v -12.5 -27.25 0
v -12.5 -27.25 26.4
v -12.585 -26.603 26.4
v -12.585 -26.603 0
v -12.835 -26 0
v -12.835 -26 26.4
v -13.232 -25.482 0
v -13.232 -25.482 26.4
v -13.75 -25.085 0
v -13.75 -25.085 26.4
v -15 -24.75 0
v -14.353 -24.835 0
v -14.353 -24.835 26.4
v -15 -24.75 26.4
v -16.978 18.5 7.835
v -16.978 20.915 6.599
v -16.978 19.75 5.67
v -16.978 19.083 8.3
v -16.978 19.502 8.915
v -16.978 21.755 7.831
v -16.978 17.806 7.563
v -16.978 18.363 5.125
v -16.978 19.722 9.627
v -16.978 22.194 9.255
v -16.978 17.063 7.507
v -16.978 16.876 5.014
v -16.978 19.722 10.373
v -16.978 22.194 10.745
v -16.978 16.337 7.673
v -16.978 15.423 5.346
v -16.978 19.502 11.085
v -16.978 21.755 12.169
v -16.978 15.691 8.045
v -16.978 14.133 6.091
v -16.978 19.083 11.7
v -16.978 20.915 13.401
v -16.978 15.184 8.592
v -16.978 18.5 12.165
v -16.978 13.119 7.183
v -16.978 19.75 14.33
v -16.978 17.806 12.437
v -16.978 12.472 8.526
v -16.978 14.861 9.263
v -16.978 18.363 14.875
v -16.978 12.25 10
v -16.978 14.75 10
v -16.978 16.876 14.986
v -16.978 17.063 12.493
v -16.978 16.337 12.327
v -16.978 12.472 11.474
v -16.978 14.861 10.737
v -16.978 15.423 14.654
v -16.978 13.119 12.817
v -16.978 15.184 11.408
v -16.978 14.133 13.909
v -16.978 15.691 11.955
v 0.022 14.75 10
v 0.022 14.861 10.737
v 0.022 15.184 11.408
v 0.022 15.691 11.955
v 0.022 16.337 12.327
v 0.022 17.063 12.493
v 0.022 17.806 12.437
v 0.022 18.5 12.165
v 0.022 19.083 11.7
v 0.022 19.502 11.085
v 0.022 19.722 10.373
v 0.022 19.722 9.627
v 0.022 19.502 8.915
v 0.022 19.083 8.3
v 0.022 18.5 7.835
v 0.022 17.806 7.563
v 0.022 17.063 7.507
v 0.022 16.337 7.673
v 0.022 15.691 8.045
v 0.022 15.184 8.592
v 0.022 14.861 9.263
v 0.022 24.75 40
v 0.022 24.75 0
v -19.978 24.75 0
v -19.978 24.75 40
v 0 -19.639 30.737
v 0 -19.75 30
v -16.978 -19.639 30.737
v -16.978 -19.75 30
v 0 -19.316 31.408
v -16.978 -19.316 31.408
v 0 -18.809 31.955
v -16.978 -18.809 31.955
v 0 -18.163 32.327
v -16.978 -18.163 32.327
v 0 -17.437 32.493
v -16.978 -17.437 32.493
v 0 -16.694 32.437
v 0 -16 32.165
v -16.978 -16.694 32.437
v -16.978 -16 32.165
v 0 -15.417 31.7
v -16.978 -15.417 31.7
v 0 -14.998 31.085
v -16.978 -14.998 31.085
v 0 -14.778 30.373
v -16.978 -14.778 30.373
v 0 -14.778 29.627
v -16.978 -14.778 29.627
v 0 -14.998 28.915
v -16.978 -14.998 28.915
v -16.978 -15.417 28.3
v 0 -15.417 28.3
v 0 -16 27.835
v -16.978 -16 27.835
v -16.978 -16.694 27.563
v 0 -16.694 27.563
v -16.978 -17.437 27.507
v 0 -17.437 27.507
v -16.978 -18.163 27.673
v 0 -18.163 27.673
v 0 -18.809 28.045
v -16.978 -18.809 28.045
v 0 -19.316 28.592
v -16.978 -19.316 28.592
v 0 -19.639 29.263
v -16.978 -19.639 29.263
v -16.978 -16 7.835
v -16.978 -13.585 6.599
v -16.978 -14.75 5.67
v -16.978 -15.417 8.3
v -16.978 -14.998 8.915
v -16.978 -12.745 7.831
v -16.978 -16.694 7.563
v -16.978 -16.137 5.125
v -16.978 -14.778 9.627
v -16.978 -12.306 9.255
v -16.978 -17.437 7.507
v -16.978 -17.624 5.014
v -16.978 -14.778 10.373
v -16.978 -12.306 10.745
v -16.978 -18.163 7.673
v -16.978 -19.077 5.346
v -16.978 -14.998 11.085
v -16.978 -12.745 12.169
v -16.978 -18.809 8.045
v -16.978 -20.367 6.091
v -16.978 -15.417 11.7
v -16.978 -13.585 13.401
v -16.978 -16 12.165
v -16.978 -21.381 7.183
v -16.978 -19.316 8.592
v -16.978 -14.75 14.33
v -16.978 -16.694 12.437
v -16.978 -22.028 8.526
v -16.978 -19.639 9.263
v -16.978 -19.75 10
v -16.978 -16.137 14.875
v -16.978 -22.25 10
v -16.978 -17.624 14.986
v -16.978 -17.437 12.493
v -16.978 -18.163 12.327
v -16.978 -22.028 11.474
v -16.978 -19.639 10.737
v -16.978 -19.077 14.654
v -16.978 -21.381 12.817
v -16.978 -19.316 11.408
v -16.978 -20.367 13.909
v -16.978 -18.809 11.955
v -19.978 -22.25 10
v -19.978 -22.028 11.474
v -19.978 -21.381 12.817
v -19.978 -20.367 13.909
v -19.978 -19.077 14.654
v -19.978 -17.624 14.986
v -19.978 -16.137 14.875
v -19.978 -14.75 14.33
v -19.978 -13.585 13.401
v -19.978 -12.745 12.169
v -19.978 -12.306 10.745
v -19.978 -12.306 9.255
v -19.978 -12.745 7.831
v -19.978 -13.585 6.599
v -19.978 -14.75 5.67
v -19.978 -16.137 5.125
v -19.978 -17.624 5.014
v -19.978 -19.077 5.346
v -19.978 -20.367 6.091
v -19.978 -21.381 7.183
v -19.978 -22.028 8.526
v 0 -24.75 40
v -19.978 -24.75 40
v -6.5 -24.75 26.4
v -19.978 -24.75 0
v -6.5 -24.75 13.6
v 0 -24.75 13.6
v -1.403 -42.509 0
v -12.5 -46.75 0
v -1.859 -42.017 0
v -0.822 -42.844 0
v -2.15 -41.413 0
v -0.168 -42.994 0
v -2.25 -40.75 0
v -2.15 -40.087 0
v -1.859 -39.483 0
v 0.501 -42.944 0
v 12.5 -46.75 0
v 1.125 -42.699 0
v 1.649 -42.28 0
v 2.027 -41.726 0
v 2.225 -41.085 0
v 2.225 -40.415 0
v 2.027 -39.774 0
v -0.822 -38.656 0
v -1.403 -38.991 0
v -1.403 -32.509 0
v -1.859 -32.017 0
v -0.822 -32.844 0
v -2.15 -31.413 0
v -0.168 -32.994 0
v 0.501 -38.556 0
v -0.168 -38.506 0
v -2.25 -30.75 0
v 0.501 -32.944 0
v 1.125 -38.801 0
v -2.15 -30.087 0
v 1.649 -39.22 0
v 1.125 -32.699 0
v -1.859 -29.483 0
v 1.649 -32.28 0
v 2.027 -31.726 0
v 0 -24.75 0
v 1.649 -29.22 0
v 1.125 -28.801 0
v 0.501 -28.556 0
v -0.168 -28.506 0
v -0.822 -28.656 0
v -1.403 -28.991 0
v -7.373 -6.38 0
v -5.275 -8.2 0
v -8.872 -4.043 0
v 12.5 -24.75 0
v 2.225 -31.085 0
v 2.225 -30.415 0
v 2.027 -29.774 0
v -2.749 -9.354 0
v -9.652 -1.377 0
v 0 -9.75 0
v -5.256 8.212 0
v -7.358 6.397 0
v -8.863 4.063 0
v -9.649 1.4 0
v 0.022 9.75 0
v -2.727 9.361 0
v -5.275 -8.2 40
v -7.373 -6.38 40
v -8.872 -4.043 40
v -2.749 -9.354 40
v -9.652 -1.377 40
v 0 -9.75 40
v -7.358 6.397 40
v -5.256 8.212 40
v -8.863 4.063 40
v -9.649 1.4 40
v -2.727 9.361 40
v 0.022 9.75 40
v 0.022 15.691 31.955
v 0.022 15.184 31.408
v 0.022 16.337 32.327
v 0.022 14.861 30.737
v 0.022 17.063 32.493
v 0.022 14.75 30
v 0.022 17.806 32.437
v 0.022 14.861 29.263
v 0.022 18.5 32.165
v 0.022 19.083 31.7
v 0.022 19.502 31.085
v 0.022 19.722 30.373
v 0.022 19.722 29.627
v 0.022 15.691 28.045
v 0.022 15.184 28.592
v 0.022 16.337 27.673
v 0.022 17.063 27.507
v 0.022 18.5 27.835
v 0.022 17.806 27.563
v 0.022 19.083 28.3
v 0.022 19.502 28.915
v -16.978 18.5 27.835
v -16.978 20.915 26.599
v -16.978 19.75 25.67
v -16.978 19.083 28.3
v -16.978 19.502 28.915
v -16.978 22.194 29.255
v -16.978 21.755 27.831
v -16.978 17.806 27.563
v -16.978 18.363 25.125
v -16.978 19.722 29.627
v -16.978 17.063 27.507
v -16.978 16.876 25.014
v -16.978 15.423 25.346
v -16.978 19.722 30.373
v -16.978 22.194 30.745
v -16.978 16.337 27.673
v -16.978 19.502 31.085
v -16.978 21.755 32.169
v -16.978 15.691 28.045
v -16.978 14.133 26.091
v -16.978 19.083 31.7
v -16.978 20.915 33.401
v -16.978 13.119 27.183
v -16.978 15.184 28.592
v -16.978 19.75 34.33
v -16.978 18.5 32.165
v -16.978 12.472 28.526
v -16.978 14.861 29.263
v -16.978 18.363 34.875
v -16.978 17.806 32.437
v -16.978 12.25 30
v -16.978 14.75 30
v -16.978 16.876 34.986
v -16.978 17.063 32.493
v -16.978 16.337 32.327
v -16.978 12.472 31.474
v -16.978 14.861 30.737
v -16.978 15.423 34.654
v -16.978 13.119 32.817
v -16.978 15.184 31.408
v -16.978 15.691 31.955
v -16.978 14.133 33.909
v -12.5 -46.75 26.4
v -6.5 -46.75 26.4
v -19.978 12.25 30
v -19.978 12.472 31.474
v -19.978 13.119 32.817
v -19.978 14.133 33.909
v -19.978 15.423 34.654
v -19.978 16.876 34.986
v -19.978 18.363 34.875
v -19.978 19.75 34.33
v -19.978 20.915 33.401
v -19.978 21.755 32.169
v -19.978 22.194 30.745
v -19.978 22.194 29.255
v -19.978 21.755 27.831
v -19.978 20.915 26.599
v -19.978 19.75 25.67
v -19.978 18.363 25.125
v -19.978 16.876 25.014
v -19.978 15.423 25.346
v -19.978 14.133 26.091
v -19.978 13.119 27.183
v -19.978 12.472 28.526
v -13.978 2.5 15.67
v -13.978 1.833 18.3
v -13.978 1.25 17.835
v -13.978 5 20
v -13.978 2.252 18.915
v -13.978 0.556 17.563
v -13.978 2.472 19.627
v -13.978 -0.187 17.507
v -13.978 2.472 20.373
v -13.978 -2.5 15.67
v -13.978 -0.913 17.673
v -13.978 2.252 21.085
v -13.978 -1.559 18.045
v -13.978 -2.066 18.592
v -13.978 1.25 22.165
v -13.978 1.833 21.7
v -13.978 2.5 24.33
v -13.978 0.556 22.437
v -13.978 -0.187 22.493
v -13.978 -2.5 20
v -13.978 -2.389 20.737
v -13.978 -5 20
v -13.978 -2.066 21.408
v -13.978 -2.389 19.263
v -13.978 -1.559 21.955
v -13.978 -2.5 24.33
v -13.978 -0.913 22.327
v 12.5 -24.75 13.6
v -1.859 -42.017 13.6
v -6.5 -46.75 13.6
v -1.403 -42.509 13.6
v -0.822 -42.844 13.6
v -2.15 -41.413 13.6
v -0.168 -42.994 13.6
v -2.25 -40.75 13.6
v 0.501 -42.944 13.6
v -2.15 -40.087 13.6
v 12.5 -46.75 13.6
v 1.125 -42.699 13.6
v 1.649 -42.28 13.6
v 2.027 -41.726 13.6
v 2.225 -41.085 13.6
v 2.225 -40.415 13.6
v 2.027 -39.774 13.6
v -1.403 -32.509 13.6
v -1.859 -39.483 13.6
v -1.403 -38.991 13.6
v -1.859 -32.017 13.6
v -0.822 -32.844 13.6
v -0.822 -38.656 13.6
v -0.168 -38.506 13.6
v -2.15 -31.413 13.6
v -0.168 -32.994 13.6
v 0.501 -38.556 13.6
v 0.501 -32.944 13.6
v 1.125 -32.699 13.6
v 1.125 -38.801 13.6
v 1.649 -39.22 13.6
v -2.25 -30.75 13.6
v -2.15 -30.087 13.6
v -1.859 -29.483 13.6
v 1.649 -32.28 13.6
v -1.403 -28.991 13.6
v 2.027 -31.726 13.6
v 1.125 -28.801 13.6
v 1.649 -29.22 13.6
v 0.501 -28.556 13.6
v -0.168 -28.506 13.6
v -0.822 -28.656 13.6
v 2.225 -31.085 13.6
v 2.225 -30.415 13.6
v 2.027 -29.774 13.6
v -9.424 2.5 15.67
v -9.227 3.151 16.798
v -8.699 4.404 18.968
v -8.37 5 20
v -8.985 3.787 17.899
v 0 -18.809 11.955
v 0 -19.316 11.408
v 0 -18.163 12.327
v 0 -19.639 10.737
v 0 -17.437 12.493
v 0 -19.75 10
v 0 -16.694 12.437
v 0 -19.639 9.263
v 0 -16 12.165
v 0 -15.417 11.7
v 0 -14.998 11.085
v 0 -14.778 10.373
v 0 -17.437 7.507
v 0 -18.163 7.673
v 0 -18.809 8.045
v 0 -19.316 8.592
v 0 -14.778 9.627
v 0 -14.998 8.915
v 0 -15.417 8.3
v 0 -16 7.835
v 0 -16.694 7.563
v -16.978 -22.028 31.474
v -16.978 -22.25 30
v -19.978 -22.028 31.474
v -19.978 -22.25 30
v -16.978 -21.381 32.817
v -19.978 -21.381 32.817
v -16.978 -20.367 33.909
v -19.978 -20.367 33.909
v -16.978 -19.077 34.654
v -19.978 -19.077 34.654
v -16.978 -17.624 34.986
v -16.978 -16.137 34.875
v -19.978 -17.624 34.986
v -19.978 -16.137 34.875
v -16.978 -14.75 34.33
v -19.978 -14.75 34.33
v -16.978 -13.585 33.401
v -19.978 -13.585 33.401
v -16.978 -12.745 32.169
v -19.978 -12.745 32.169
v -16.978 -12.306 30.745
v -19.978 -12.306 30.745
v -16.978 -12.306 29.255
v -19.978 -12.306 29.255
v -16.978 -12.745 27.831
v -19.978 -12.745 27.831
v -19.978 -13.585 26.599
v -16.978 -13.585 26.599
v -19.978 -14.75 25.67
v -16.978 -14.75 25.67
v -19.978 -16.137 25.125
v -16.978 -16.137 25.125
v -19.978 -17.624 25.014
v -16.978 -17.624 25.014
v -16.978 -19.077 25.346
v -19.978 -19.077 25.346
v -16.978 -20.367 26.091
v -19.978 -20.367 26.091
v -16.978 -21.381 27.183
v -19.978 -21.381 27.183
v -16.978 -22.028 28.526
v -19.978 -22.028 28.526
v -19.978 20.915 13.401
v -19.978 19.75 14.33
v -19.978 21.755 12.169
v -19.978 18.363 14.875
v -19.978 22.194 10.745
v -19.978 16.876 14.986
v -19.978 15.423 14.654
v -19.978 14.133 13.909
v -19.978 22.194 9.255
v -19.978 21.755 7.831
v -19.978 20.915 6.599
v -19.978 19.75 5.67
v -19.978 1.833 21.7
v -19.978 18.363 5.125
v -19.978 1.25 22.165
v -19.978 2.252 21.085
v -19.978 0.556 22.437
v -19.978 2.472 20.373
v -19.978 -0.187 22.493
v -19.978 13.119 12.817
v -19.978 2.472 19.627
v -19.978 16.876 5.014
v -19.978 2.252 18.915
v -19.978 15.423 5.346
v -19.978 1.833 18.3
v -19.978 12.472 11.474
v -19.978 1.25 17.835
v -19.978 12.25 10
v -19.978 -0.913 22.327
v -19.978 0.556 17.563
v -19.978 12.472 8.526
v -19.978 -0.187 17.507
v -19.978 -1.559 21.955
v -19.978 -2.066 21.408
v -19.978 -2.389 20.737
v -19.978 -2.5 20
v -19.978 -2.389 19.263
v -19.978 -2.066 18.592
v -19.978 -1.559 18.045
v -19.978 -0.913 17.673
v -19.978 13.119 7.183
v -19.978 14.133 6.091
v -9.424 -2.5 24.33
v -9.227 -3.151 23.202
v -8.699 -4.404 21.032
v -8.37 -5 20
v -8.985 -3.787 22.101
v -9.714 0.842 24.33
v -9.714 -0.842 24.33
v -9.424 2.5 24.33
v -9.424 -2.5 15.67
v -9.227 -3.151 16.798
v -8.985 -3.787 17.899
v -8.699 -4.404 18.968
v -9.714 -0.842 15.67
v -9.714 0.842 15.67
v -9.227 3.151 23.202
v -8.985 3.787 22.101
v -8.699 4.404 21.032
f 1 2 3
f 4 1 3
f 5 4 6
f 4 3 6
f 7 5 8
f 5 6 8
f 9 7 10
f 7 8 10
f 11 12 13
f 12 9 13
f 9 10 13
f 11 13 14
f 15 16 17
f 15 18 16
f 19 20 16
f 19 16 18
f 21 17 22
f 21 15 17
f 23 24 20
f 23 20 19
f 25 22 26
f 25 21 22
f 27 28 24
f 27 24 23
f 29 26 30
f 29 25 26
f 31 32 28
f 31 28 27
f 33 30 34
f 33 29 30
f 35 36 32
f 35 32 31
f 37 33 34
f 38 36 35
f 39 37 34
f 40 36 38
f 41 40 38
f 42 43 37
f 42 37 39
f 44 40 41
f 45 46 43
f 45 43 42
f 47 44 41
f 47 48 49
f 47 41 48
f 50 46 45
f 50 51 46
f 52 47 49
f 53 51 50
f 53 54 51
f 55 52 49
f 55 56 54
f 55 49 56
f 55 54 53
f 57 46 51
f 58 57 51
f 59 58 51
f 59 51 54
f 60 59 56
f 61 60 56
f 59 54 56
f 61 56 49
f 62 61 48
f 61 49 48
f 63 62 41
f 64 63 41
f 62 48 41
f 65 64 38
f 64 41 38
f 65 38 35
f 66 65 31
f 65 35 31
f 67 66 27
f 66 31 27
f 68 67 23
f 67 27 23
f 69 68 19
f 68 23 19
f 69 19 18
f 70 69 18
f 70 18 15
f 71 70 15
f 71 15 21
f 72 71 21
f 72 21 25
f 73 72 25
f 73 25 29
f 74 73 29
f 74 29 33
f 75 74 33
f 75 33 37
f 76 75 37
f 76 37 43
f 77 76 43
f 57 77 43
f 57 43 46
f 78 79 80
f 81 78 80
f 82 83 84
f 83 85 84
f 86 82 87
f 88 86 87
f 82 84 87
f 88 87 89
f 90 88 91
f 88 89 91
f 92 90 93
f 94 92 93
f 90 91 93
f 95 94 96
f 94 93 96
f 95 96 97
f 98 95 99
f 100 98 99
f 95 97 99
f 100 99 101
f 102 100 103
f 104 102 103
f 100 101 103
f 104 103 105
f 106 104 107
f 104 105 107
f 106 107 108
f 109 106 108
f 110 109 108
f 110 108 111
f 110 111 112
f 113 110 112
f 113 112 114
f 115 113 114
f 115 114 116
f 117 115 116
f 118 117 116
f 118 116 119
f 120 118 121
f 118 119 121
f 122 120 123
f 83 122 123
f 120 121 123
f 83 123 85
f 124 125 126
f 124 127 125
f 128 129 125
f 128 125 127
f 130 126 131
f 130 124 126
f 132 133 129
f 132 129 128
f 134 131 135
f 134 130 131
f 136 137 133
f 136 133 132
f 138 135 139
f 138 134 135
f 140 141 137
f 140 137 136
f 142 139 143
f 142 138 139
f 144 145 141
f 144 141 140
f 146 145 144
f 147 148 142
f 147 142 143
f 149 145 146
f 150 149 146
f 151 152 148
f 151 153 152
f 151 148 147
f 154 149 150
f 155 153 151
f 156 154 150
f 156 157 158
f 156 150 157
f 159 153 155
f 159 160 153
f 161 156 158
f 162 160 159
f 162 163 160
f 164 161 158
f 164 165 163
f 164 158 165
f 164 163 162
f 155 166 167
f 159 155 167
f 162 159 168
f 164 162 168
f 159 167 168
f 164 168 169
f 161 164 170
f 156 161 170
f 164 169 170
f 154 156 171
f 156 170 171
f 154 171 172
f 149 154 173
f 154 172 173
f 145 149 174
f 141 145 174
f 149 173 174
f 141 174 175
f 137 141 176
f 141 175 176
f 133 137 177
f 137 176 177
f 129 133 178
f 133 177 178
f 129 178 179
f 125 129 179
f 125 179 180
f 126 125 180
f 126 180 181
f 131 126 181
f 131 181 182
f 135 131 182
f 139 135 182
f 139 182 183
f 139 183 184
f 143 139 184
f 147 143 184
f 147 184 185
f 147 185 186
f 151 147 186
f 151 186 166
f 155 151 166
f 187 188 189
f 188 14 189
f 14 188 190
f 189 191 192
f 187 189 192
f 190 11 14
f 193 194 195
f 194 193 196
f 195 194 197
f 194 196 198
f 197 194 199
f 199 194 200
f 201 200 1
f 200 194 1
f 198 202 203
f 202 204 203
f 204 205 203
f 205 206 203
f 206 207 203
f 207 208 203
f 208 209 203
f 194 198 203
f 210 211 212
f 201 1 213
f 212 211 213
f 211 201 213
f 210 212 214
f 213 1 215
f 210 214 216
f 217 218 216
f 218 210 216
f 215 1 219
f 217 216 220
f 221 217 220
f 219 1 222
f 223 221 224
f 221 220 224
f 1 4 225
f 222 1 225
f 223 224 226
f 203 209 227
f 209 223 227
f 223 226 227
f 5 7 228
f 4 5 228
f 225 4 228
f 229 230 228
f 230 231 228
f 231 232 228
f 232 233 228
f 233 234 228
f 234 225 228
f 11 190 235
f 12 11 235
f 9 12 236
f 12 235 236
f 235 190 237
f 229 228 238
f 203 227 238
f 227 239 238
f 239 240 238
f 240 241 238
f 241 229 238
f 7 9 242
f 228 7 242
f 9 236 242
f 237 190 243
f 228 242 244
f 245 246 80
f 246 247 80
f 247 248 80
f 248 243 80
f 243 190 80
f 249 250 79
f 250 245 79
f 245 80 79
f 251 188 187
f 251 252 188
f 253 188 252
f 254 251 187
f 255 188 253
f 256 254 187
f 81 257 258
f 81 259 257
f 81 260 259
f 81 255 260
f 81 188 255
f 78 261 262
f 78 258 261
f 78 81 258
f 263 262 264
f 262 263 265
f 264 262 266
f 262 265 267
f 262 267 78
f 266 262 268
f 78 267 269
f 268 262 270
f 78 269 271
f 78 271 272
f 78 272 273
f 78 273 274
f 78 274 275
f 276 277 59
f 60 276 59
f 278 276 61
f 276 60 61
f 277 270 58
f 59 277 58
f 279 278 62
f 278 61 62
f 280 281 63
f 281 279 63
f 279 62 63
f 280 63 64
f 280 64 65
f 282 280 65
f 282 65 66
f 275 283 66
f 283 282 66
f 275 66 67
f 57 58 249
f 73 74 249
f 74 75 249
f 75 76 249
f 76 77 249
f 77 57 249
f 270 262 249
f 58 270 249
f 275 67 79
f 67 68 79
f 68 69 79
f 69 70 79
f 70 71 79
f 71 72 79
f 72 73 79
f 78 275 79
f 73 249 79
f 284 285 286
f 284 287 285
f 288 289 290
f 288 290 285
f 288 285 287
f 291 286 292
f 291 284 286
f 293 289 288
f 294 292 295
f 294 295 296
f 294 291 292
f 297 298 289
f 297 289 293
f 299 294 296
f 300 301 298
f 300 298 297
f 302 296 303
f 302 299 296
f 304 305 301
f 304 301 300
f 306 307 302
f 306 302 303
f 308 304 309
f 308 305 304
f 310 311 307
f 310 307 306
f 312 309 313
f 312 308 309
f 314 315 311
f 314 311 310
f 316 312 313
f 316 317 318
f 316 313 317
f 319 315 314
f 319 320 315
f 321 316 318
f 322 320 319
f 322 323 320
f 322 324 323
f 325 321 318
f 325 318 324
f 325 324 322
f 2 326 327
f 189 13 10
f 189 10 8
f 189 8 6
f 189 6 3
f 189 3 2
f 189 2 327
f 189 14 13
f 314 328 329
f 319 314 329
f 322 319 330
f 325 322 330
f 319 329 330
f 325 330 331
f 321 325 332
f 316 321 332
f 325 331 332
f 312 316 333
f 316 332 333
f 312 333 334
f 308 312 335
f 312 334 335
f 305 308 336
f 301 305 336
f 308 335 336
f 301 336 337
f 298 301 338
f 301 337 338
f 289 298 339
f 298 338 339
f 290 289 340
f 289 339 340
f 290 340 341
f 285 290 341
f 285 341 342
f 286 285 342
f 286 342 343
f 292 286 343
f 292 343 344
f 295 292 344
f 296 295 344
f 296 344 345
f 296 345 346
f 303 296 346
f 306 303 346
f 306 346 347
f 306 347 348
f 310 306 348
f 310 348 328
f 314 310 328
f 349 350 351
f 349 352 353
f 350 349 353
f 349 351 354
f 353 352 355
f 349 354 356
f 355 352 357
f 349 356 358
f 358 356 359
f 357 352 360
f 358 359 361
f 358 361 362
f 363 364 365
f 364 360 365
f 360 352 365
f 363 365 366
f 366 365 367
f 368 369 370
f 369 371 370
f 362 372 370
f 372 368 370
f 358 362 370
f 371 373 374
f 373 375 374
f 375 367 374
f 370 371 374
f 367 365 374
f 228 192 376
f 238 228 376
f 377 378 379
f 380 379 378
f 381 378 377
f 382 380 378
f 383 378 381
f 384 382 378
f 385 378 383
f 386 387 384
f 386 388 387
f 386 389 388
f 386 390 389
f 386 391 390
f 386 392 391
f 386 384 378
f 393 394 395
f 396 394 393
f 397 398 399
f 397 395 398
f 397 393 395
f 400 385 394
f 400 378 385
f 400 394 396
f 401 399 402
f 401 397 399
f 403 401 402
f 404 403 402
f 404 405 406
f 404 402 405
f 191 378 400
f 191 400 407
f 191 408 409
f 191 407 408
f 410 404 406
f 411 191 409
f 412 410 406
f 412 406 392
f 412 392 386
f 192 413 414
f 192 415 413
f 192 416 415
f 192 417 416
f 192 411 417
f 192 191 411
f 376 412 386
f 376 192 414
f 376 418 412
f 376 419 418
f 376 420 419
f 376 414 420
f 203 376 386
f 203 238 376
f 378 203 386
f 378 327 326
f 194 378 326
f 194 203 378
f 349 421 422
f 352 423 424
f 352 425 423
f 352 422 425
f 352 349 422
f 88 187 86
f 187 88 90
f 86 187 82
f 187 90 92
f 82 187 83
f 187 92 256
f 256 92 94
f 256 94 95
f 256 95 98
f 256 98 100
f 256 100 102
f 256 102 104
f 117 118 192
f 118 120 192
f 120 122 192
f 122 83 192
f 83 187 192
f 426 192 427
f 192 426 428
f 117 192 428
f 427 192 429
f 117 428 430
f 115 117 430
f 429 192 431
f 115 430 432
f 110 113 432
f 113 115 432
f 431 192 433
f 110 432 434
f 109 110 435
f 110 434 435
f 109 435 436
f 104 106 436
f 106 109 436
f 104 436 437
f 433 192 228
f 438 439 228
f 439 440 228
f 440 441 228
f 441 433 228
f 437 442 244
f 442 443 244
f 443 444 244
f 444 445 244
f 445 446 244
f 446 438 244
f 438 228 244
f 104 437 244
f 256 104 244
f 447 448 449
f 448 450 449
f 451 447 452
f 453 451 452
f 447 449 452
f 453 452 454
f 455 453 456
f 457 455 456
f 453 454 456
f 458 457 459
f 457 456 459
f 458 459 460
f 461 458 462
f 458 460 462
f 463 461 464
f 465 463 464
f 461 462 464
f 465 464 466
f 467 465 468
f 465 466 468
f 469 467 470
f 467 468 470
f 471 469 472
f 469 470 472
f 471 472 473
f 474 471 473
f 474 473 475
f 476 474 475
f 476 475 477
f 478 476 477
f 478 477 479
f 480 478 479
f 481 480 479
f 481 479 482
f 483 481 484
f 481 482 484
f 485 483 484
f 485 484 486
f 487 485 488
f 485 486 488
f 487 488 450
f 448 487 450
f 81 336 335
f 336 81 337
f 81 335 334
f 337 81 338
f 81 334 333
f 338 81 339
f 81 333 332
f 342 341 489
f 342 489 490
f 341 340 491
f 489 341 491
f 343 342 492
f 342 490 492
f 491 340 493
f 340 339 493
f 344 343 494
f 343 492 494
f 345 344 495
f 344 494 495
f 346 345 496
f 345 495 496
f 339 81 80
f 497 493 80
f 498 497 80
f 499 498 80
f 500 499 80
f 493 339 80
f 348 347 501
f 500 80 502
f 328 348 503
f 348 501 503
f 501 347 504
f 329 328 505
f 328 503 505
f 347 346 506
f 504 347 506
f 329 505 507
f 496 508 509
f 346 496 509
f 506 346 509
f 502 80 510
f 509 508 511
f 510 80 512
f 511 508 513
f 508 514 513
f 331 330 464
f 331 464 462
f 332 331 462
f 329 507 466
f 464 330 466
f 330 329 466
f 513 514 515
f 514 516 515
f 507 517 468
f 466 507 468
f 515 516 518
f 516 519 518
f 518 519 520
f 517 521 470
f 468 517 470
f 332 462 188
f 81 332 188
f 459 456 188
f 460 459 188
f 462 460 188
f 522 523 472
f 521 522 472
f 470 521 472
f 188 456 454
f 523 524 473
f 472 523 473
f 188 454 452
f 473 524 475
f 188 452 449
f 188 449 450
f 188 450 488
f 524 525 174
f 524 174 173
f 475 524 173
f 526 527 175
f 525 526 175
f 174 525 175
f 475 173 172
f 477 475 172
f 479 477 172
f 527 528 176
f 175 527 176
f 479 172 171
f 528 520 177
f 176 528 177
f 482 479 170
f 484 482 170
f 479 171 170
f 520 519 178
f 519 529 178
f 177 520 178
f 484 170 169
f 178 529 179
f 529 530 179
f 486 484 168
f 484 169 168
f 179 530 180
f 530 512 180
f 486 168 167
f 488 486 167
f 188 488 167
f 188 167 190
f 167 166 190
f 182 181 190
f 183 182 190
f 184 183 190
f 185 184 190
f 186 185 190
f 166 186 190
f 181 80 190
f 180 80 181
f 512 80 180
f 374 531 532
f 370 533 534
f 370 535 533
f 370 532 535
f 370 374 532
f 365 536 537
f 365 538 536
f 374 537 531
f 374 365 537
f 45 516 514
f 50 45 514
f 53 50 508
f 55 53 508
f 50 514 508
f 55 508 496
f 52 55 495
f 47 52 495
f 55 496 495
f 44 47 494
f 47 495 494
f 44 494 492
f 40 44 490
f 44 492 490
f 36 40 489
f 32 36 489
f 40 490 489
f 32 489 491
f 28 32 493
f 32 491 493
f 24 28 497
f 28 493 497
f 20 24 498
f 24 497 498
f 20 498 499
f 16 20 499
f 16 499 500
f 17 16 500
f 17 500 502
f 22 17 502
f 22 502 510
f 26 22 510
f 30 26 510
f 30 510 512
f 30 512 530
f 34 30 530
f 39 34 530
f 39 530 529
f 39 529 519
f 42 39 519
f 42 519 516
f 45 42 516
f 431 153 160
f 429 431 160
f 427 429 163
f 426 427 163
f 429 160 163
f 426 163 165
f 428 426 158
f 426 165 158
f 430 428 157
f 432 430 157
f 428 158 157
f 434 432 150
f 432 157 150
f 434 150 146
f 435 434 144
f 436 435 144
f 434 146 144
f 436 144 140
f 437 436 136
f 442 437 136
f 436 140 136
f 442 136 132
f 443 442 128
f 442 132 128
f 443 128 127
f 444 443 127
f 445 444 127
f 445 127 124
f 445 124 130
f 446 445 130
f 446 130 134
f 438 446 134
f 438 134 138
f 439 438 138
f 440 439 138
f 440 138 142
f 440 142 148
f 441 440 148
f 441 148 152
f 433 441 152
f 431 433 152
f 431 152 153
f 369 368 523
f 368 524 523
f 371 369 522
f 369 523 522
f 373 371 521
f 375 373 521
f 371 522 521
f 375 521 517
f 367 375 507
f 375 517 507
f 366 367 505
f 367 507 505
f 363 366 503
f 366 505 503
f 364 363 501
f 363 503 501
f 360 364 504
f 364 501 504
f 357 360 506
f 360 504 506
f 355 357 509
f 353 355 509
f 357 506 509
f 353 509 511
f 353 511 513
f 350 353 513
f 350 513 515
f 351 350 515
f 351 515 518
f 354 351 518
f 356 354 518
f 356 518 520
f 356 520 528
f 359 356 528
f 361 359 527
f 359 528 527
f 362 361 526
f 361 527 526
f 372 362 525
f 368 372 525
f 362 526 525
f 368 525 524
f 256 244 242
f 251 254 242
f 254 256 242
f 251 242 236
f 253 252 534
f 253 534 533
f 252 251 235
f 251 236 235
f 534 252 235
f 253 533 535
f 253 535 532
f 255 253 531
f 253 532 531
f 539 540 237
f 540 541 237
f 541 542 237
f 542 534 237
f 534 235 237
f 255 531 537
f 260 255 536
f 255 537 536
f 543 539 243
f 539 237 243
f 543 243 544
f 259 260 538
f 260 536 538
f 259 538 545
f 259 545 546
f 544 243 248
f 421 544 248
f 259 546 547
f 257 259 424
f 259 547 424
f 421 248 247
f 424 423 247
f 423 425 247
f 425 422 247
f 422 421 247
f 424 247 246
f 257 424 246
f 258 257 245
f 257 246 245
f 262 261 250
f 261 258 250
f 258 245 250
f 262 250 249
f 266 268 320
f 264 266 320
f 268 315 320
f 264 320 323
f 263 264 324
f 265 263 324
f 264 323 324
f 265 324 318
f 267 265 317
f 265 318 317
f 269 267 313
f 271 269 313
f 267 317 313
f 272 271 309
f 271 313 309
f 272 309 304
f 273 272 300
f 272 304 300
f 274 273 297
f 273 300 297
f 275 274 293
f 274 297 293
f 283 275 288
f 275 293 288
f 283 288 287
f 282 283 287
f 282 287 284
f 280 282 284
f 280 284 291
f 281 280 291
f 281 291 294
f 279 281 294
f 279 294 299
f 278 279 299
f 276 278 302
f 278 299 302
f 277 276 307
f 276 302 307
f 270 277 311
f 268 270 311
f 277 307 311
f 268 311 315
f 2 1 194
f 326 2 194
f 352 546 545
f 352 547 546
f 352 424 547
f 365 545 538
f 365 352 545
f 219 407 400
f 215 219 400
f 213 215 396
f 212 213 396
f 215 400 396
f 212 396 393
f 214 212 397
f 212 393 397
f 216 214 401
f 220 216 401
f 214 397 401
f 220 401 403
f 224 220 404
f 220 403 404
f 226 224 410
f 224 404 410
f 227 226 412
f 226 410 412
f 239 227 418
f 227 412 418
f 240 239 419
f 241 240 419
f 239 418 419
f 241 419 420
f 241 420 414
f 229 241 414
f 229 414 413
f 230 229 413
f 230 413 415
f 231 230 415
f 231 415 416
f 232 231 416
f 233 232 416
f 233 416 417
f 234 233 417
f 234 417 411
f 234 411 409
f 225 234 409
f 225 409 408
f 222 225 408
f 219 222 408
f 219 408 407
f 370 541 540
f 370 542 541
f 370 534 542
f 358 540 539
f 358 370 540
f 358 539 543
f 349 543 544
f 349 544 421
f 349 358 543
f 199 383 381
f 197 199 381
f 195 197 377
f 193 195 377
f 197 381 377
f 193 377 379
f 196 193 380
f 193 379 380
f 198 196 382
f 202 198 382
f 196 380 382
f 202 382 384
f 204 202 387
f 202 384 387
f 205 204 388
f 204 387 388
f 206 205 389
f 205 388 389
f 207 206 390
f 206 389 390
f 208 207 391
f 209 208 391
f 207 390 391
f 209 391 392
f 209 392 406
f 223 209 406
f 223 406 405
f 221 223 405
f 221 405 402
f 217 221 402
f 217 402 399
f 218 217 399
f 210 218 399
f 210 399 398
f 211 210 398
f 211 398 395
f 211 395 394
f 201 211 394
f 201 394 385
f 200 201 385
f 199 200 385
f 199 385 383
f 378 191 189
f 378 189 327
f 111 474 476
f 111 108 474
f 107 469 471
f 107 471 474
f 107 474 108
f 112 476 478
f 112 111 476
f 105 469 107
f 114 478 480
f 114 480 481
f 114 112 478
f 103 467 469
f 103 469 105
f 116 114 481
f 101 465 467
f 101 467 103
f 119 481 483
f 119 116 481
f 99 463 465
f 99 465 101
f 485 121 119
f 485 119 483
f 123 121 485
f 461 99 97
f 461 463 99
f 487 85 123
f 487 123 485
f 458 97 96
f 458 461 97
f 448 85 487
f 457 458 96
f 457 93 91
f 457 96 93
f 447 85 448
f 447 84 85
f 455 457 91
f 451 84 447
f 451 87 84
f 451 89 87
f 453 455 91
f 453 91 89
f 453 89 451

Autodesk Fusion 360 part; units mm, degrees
sketch "Sketch1" plane through (0, 0, 0) normal (0, 0, 1) x (1, 0, 0)
  circle A0 centre (0, 0) radius 9.75
  line L0 (0.0224, 9.75) -> (0.0224, 24.75)
  line L1 (0.0224, 24.75) -> (-19.9776, 24.75)
  line L2 (-19.9776, 24.75) -> (-19.9776, -24.75)
  line L3 (-19.9776, -24.75) -> (0, -24.75)
  line L4 (0, -24.75) -> (0, -9.75)
  line L5 (0, -24.75) -> (6.5, -24.75) construction
  line L6 (0, -24.75) -> (-6.5, -24.75) construction
  line L7 (-6.5, -24.75) -> (-6.5, -46.75)
  line L8 (-6.5, -46.75) -> (12.5, -46.75)
  line L9 (12.5, -46.75) -> (12.5, -25)
  line L10 (-6.5, -24.75) -> (-12.5, -24.75)
  line L11 (-12.5, -24.75) -> (-12.5, -46.75)
  line L12 (0, -24.75) -> (12.5, -24.75)
  line L13 (12.5, -24.75) -> (12.5, -25)
  line L14 (-6.5, -46.75) -> (-12.5, -46.75)
  dimension "d1" = 19.5
  dimension "d2" = 15
  dimension "d3" = 20
  dimension "d4" = 49.5
  dimension "d5" = 6.5
  dimension "d6" = 6.5
  dimension "d7" = 22
  dimension "d8" = 19
  dimension "d9" = 6
extrude "Extrude1" add sketch "Sketch1" along normal blind 40 contours A0 L0 L1 L2 L3 L4 L10
extrude "Extrude2" add sketch "Sketch1" along normal blind 13.6 contours L3 L7 L8 L9 L12 L13
extrude "Extrude3" add sketch "Sketch1" along normal blind 26.4 contours L3 L7 L10 L11 L14
sketch "Sketch2" plane through (-19.9776, 0, 0) normal (-1, 0, 0) x (0, -1, 0)
  line L0 (-24.75, 0) -> (24.75, 0)
  line L1 (24.75, 0) -> (24.75, 40)
  line L2 (24.75, 40) -> (-24.75, 40)
  line L3 (-24.75, 40) -> (-24.75, 0)
  line L4 (0, 40) -> (-9.75, 40) construction
  line L5 (-24.75, 40) -> (-17.25, 40) construction
  line L6 (-17.25, 40) -> (-17.25, 30) construction
  circle A0 centre (-17.25, 30) radius 2.5
  circle A1 centre (17.25, 30) radius 2.5
  circle A2 centre (-17.25, 10) radius 2.5
  circle A3 centre (17.25, 10) radius 2.5
  dimension "d16" = 9.75
  dimension "d17" = 7.5
  dimension "d18" = 10
  dimension "d20" = 5
  dimension "d23" = 34.5
  dimension "d24" = -20
extrude "Extrude4" cut sketch "Sketch2" against normal blind 30 contours A0 | A1 | A2 | A3
sketch "Sketch3" plane through (0, 0, 13.6) normal (0, 0, 1) x (-1, 0, 0)
  line L0 (6.5, 24.75) -> (6.5, 46.75)
  line L1 (6.5, 46.75) -> (-12.5, 46.75)
  line L2 (-12.5, 46.75) -> (-12.5, 25)
  line L3 (0, 24.75) -> (6.5, 24.75)
  line L4 (-12.5, 25) -> (-12.5, 24.75)
  line L5 (-12.5, 24.75) -> (0, 24.75)
  line L6 (0, 24.75) -> (0, 30.75) construction
  circle A0 centre (0, 30.75) radius 2.25
  circle A1 centre (0, 40.75) radius 2.25
  dimension "d28" = 6
  dimension "d29" = 4.5
  dimension "d32" = 0
  dimension "d33" = 10
extrude "Extrude5" cut sketch "Sketch3" against normal blind 14 contours A0 | A1
sketch "Sketch4" plane through (-19.9776, 0, 0) normal (-1, 0, 0) x (0, -1, 0)
  circle A0 centre (17.25, 30) radius 2.5
  circle A1 centre (17.25, 10) radius 2.5
  circle A2 centre (-17.25, 30) radius 2.5
  circle A3 centre (-17.25, 10) radius 2.5
  line L0 (-24.75, 0) -> (24.75, 0)
  line L1 (24.75, 0) -> (24.75, 40)
  line L2 (24.75, 40) -> (-24.75, 40)
  line L3 (-24.75, 40) -> (-24.75, 0)
  line L4 (0, 40) -> (0, 0) construction
  circle A4 centre (0, 20) radius 2.5
  dimension "d36" = 5
extrude "Extrude6" cut sketch "Sketch4" against normal blind 20 contours A4
sketch "Sketch5" plane through (-19.9776, 0, 0) normal (-1, 0, 0) x (0, -1, 0)
  circle A0 centre (0, 20) radius 2.5
  circle A1 centre (17.25, 30) radius 2.5
  circle A2 centre (17.25, 10) radius 2.5
  circle A3 centre (-17.25, 30) radius 2.5
  circle A4 centre (-17.25, 10) radius 2.5
  line L0 (-24.75, 0) -> (24.75, 0)
  line L1 (24.75, 0) -> (24.75, 40)
  line L2 (24.75, 40) -> (-24.75, 40)
  line L3 (-24.75, 40) -> (-24.75, 0)
  line L4 (0, 20) -> (2.5, 24.3301) construction
  line L5 (0, 20) -> (5, 20) construction
  line L6 (0, 20) -> (-2.5, 24.3301) construction
  line L7 (0, 20) -> (5, 20) construction
  line L8 (0, 20) -> (-5, 20) construction
  line L9 (0, 20) -> (2.5, 15.6699) construction
  line L10 (-2.5, 15.6699) -> (0, 20) construction
  line L11 (5, 20) -> (2.5, 15.6699)
  line L12 (2.5, 15.6699) -> (-2.5, 15.6699)
  line L13 (-2.5, 15.6699) -> (-5, 20)
  line L14 (-5, 20) -> (-2.5, 24.3301)
  line L15 (-2.5, 24.3301) -> (2.5, 24.3301)
  line L16 (2.5, 24.3301) -> (5, 20)
  dimension "d40" = 60
  dimension "d41" = 5
  dimension "d42" = 120
  dimension "d43" = 5
  dimension "d44" = 5
  dimension "d45" = 5
extrude "Extrude7" cut sketch "Sketch5" against normal blind 7 from surface at -6 contours L11 L12 L13 L14 L15 L16
sketch "Sketch6" plane through (-19.9776, 0, 0) normal (-1, 0, 0) x (0, -1, 0)
  circle A0 centre (0, 20) radius 2.5
  circle A1 centre (17.25, 30) radius 2.5
  circle A2 centre (17.25, 10) radius 2.5
  circle A3 centre (-17.25, 30) radius 2.5
  circle A4 centre (-17.25, 10) radius 2.5
  line L0 (-24.75, 0) -> (24.75, 0)
  line L1 (24.75, 0) -> (24.75, 40)
  line L2 (24.75, 40) -> (-24.75, 40)
  line L3 (-24.75, 40) -> (-24.75, 0)
  circle A5 centre (-17.25, 30) radius 5
  circle A6 centre (17.25, 30) radius 5
  circle A7 centre (-17.25, 10) radius 5
  circle A8 centre (17.25, 10) radius 5
  dimension "d49" = 10
  dimension "d52" = 34.5
  dimension "d53" = -20
extrude "Extrude8" cut sketch "Sketch6" against normal blind 3 contours A5 | A6 | A7 | A8
fillet "Fillet1" radius 2.5 1 edges at (-12.5, -24.75, 13.2)
